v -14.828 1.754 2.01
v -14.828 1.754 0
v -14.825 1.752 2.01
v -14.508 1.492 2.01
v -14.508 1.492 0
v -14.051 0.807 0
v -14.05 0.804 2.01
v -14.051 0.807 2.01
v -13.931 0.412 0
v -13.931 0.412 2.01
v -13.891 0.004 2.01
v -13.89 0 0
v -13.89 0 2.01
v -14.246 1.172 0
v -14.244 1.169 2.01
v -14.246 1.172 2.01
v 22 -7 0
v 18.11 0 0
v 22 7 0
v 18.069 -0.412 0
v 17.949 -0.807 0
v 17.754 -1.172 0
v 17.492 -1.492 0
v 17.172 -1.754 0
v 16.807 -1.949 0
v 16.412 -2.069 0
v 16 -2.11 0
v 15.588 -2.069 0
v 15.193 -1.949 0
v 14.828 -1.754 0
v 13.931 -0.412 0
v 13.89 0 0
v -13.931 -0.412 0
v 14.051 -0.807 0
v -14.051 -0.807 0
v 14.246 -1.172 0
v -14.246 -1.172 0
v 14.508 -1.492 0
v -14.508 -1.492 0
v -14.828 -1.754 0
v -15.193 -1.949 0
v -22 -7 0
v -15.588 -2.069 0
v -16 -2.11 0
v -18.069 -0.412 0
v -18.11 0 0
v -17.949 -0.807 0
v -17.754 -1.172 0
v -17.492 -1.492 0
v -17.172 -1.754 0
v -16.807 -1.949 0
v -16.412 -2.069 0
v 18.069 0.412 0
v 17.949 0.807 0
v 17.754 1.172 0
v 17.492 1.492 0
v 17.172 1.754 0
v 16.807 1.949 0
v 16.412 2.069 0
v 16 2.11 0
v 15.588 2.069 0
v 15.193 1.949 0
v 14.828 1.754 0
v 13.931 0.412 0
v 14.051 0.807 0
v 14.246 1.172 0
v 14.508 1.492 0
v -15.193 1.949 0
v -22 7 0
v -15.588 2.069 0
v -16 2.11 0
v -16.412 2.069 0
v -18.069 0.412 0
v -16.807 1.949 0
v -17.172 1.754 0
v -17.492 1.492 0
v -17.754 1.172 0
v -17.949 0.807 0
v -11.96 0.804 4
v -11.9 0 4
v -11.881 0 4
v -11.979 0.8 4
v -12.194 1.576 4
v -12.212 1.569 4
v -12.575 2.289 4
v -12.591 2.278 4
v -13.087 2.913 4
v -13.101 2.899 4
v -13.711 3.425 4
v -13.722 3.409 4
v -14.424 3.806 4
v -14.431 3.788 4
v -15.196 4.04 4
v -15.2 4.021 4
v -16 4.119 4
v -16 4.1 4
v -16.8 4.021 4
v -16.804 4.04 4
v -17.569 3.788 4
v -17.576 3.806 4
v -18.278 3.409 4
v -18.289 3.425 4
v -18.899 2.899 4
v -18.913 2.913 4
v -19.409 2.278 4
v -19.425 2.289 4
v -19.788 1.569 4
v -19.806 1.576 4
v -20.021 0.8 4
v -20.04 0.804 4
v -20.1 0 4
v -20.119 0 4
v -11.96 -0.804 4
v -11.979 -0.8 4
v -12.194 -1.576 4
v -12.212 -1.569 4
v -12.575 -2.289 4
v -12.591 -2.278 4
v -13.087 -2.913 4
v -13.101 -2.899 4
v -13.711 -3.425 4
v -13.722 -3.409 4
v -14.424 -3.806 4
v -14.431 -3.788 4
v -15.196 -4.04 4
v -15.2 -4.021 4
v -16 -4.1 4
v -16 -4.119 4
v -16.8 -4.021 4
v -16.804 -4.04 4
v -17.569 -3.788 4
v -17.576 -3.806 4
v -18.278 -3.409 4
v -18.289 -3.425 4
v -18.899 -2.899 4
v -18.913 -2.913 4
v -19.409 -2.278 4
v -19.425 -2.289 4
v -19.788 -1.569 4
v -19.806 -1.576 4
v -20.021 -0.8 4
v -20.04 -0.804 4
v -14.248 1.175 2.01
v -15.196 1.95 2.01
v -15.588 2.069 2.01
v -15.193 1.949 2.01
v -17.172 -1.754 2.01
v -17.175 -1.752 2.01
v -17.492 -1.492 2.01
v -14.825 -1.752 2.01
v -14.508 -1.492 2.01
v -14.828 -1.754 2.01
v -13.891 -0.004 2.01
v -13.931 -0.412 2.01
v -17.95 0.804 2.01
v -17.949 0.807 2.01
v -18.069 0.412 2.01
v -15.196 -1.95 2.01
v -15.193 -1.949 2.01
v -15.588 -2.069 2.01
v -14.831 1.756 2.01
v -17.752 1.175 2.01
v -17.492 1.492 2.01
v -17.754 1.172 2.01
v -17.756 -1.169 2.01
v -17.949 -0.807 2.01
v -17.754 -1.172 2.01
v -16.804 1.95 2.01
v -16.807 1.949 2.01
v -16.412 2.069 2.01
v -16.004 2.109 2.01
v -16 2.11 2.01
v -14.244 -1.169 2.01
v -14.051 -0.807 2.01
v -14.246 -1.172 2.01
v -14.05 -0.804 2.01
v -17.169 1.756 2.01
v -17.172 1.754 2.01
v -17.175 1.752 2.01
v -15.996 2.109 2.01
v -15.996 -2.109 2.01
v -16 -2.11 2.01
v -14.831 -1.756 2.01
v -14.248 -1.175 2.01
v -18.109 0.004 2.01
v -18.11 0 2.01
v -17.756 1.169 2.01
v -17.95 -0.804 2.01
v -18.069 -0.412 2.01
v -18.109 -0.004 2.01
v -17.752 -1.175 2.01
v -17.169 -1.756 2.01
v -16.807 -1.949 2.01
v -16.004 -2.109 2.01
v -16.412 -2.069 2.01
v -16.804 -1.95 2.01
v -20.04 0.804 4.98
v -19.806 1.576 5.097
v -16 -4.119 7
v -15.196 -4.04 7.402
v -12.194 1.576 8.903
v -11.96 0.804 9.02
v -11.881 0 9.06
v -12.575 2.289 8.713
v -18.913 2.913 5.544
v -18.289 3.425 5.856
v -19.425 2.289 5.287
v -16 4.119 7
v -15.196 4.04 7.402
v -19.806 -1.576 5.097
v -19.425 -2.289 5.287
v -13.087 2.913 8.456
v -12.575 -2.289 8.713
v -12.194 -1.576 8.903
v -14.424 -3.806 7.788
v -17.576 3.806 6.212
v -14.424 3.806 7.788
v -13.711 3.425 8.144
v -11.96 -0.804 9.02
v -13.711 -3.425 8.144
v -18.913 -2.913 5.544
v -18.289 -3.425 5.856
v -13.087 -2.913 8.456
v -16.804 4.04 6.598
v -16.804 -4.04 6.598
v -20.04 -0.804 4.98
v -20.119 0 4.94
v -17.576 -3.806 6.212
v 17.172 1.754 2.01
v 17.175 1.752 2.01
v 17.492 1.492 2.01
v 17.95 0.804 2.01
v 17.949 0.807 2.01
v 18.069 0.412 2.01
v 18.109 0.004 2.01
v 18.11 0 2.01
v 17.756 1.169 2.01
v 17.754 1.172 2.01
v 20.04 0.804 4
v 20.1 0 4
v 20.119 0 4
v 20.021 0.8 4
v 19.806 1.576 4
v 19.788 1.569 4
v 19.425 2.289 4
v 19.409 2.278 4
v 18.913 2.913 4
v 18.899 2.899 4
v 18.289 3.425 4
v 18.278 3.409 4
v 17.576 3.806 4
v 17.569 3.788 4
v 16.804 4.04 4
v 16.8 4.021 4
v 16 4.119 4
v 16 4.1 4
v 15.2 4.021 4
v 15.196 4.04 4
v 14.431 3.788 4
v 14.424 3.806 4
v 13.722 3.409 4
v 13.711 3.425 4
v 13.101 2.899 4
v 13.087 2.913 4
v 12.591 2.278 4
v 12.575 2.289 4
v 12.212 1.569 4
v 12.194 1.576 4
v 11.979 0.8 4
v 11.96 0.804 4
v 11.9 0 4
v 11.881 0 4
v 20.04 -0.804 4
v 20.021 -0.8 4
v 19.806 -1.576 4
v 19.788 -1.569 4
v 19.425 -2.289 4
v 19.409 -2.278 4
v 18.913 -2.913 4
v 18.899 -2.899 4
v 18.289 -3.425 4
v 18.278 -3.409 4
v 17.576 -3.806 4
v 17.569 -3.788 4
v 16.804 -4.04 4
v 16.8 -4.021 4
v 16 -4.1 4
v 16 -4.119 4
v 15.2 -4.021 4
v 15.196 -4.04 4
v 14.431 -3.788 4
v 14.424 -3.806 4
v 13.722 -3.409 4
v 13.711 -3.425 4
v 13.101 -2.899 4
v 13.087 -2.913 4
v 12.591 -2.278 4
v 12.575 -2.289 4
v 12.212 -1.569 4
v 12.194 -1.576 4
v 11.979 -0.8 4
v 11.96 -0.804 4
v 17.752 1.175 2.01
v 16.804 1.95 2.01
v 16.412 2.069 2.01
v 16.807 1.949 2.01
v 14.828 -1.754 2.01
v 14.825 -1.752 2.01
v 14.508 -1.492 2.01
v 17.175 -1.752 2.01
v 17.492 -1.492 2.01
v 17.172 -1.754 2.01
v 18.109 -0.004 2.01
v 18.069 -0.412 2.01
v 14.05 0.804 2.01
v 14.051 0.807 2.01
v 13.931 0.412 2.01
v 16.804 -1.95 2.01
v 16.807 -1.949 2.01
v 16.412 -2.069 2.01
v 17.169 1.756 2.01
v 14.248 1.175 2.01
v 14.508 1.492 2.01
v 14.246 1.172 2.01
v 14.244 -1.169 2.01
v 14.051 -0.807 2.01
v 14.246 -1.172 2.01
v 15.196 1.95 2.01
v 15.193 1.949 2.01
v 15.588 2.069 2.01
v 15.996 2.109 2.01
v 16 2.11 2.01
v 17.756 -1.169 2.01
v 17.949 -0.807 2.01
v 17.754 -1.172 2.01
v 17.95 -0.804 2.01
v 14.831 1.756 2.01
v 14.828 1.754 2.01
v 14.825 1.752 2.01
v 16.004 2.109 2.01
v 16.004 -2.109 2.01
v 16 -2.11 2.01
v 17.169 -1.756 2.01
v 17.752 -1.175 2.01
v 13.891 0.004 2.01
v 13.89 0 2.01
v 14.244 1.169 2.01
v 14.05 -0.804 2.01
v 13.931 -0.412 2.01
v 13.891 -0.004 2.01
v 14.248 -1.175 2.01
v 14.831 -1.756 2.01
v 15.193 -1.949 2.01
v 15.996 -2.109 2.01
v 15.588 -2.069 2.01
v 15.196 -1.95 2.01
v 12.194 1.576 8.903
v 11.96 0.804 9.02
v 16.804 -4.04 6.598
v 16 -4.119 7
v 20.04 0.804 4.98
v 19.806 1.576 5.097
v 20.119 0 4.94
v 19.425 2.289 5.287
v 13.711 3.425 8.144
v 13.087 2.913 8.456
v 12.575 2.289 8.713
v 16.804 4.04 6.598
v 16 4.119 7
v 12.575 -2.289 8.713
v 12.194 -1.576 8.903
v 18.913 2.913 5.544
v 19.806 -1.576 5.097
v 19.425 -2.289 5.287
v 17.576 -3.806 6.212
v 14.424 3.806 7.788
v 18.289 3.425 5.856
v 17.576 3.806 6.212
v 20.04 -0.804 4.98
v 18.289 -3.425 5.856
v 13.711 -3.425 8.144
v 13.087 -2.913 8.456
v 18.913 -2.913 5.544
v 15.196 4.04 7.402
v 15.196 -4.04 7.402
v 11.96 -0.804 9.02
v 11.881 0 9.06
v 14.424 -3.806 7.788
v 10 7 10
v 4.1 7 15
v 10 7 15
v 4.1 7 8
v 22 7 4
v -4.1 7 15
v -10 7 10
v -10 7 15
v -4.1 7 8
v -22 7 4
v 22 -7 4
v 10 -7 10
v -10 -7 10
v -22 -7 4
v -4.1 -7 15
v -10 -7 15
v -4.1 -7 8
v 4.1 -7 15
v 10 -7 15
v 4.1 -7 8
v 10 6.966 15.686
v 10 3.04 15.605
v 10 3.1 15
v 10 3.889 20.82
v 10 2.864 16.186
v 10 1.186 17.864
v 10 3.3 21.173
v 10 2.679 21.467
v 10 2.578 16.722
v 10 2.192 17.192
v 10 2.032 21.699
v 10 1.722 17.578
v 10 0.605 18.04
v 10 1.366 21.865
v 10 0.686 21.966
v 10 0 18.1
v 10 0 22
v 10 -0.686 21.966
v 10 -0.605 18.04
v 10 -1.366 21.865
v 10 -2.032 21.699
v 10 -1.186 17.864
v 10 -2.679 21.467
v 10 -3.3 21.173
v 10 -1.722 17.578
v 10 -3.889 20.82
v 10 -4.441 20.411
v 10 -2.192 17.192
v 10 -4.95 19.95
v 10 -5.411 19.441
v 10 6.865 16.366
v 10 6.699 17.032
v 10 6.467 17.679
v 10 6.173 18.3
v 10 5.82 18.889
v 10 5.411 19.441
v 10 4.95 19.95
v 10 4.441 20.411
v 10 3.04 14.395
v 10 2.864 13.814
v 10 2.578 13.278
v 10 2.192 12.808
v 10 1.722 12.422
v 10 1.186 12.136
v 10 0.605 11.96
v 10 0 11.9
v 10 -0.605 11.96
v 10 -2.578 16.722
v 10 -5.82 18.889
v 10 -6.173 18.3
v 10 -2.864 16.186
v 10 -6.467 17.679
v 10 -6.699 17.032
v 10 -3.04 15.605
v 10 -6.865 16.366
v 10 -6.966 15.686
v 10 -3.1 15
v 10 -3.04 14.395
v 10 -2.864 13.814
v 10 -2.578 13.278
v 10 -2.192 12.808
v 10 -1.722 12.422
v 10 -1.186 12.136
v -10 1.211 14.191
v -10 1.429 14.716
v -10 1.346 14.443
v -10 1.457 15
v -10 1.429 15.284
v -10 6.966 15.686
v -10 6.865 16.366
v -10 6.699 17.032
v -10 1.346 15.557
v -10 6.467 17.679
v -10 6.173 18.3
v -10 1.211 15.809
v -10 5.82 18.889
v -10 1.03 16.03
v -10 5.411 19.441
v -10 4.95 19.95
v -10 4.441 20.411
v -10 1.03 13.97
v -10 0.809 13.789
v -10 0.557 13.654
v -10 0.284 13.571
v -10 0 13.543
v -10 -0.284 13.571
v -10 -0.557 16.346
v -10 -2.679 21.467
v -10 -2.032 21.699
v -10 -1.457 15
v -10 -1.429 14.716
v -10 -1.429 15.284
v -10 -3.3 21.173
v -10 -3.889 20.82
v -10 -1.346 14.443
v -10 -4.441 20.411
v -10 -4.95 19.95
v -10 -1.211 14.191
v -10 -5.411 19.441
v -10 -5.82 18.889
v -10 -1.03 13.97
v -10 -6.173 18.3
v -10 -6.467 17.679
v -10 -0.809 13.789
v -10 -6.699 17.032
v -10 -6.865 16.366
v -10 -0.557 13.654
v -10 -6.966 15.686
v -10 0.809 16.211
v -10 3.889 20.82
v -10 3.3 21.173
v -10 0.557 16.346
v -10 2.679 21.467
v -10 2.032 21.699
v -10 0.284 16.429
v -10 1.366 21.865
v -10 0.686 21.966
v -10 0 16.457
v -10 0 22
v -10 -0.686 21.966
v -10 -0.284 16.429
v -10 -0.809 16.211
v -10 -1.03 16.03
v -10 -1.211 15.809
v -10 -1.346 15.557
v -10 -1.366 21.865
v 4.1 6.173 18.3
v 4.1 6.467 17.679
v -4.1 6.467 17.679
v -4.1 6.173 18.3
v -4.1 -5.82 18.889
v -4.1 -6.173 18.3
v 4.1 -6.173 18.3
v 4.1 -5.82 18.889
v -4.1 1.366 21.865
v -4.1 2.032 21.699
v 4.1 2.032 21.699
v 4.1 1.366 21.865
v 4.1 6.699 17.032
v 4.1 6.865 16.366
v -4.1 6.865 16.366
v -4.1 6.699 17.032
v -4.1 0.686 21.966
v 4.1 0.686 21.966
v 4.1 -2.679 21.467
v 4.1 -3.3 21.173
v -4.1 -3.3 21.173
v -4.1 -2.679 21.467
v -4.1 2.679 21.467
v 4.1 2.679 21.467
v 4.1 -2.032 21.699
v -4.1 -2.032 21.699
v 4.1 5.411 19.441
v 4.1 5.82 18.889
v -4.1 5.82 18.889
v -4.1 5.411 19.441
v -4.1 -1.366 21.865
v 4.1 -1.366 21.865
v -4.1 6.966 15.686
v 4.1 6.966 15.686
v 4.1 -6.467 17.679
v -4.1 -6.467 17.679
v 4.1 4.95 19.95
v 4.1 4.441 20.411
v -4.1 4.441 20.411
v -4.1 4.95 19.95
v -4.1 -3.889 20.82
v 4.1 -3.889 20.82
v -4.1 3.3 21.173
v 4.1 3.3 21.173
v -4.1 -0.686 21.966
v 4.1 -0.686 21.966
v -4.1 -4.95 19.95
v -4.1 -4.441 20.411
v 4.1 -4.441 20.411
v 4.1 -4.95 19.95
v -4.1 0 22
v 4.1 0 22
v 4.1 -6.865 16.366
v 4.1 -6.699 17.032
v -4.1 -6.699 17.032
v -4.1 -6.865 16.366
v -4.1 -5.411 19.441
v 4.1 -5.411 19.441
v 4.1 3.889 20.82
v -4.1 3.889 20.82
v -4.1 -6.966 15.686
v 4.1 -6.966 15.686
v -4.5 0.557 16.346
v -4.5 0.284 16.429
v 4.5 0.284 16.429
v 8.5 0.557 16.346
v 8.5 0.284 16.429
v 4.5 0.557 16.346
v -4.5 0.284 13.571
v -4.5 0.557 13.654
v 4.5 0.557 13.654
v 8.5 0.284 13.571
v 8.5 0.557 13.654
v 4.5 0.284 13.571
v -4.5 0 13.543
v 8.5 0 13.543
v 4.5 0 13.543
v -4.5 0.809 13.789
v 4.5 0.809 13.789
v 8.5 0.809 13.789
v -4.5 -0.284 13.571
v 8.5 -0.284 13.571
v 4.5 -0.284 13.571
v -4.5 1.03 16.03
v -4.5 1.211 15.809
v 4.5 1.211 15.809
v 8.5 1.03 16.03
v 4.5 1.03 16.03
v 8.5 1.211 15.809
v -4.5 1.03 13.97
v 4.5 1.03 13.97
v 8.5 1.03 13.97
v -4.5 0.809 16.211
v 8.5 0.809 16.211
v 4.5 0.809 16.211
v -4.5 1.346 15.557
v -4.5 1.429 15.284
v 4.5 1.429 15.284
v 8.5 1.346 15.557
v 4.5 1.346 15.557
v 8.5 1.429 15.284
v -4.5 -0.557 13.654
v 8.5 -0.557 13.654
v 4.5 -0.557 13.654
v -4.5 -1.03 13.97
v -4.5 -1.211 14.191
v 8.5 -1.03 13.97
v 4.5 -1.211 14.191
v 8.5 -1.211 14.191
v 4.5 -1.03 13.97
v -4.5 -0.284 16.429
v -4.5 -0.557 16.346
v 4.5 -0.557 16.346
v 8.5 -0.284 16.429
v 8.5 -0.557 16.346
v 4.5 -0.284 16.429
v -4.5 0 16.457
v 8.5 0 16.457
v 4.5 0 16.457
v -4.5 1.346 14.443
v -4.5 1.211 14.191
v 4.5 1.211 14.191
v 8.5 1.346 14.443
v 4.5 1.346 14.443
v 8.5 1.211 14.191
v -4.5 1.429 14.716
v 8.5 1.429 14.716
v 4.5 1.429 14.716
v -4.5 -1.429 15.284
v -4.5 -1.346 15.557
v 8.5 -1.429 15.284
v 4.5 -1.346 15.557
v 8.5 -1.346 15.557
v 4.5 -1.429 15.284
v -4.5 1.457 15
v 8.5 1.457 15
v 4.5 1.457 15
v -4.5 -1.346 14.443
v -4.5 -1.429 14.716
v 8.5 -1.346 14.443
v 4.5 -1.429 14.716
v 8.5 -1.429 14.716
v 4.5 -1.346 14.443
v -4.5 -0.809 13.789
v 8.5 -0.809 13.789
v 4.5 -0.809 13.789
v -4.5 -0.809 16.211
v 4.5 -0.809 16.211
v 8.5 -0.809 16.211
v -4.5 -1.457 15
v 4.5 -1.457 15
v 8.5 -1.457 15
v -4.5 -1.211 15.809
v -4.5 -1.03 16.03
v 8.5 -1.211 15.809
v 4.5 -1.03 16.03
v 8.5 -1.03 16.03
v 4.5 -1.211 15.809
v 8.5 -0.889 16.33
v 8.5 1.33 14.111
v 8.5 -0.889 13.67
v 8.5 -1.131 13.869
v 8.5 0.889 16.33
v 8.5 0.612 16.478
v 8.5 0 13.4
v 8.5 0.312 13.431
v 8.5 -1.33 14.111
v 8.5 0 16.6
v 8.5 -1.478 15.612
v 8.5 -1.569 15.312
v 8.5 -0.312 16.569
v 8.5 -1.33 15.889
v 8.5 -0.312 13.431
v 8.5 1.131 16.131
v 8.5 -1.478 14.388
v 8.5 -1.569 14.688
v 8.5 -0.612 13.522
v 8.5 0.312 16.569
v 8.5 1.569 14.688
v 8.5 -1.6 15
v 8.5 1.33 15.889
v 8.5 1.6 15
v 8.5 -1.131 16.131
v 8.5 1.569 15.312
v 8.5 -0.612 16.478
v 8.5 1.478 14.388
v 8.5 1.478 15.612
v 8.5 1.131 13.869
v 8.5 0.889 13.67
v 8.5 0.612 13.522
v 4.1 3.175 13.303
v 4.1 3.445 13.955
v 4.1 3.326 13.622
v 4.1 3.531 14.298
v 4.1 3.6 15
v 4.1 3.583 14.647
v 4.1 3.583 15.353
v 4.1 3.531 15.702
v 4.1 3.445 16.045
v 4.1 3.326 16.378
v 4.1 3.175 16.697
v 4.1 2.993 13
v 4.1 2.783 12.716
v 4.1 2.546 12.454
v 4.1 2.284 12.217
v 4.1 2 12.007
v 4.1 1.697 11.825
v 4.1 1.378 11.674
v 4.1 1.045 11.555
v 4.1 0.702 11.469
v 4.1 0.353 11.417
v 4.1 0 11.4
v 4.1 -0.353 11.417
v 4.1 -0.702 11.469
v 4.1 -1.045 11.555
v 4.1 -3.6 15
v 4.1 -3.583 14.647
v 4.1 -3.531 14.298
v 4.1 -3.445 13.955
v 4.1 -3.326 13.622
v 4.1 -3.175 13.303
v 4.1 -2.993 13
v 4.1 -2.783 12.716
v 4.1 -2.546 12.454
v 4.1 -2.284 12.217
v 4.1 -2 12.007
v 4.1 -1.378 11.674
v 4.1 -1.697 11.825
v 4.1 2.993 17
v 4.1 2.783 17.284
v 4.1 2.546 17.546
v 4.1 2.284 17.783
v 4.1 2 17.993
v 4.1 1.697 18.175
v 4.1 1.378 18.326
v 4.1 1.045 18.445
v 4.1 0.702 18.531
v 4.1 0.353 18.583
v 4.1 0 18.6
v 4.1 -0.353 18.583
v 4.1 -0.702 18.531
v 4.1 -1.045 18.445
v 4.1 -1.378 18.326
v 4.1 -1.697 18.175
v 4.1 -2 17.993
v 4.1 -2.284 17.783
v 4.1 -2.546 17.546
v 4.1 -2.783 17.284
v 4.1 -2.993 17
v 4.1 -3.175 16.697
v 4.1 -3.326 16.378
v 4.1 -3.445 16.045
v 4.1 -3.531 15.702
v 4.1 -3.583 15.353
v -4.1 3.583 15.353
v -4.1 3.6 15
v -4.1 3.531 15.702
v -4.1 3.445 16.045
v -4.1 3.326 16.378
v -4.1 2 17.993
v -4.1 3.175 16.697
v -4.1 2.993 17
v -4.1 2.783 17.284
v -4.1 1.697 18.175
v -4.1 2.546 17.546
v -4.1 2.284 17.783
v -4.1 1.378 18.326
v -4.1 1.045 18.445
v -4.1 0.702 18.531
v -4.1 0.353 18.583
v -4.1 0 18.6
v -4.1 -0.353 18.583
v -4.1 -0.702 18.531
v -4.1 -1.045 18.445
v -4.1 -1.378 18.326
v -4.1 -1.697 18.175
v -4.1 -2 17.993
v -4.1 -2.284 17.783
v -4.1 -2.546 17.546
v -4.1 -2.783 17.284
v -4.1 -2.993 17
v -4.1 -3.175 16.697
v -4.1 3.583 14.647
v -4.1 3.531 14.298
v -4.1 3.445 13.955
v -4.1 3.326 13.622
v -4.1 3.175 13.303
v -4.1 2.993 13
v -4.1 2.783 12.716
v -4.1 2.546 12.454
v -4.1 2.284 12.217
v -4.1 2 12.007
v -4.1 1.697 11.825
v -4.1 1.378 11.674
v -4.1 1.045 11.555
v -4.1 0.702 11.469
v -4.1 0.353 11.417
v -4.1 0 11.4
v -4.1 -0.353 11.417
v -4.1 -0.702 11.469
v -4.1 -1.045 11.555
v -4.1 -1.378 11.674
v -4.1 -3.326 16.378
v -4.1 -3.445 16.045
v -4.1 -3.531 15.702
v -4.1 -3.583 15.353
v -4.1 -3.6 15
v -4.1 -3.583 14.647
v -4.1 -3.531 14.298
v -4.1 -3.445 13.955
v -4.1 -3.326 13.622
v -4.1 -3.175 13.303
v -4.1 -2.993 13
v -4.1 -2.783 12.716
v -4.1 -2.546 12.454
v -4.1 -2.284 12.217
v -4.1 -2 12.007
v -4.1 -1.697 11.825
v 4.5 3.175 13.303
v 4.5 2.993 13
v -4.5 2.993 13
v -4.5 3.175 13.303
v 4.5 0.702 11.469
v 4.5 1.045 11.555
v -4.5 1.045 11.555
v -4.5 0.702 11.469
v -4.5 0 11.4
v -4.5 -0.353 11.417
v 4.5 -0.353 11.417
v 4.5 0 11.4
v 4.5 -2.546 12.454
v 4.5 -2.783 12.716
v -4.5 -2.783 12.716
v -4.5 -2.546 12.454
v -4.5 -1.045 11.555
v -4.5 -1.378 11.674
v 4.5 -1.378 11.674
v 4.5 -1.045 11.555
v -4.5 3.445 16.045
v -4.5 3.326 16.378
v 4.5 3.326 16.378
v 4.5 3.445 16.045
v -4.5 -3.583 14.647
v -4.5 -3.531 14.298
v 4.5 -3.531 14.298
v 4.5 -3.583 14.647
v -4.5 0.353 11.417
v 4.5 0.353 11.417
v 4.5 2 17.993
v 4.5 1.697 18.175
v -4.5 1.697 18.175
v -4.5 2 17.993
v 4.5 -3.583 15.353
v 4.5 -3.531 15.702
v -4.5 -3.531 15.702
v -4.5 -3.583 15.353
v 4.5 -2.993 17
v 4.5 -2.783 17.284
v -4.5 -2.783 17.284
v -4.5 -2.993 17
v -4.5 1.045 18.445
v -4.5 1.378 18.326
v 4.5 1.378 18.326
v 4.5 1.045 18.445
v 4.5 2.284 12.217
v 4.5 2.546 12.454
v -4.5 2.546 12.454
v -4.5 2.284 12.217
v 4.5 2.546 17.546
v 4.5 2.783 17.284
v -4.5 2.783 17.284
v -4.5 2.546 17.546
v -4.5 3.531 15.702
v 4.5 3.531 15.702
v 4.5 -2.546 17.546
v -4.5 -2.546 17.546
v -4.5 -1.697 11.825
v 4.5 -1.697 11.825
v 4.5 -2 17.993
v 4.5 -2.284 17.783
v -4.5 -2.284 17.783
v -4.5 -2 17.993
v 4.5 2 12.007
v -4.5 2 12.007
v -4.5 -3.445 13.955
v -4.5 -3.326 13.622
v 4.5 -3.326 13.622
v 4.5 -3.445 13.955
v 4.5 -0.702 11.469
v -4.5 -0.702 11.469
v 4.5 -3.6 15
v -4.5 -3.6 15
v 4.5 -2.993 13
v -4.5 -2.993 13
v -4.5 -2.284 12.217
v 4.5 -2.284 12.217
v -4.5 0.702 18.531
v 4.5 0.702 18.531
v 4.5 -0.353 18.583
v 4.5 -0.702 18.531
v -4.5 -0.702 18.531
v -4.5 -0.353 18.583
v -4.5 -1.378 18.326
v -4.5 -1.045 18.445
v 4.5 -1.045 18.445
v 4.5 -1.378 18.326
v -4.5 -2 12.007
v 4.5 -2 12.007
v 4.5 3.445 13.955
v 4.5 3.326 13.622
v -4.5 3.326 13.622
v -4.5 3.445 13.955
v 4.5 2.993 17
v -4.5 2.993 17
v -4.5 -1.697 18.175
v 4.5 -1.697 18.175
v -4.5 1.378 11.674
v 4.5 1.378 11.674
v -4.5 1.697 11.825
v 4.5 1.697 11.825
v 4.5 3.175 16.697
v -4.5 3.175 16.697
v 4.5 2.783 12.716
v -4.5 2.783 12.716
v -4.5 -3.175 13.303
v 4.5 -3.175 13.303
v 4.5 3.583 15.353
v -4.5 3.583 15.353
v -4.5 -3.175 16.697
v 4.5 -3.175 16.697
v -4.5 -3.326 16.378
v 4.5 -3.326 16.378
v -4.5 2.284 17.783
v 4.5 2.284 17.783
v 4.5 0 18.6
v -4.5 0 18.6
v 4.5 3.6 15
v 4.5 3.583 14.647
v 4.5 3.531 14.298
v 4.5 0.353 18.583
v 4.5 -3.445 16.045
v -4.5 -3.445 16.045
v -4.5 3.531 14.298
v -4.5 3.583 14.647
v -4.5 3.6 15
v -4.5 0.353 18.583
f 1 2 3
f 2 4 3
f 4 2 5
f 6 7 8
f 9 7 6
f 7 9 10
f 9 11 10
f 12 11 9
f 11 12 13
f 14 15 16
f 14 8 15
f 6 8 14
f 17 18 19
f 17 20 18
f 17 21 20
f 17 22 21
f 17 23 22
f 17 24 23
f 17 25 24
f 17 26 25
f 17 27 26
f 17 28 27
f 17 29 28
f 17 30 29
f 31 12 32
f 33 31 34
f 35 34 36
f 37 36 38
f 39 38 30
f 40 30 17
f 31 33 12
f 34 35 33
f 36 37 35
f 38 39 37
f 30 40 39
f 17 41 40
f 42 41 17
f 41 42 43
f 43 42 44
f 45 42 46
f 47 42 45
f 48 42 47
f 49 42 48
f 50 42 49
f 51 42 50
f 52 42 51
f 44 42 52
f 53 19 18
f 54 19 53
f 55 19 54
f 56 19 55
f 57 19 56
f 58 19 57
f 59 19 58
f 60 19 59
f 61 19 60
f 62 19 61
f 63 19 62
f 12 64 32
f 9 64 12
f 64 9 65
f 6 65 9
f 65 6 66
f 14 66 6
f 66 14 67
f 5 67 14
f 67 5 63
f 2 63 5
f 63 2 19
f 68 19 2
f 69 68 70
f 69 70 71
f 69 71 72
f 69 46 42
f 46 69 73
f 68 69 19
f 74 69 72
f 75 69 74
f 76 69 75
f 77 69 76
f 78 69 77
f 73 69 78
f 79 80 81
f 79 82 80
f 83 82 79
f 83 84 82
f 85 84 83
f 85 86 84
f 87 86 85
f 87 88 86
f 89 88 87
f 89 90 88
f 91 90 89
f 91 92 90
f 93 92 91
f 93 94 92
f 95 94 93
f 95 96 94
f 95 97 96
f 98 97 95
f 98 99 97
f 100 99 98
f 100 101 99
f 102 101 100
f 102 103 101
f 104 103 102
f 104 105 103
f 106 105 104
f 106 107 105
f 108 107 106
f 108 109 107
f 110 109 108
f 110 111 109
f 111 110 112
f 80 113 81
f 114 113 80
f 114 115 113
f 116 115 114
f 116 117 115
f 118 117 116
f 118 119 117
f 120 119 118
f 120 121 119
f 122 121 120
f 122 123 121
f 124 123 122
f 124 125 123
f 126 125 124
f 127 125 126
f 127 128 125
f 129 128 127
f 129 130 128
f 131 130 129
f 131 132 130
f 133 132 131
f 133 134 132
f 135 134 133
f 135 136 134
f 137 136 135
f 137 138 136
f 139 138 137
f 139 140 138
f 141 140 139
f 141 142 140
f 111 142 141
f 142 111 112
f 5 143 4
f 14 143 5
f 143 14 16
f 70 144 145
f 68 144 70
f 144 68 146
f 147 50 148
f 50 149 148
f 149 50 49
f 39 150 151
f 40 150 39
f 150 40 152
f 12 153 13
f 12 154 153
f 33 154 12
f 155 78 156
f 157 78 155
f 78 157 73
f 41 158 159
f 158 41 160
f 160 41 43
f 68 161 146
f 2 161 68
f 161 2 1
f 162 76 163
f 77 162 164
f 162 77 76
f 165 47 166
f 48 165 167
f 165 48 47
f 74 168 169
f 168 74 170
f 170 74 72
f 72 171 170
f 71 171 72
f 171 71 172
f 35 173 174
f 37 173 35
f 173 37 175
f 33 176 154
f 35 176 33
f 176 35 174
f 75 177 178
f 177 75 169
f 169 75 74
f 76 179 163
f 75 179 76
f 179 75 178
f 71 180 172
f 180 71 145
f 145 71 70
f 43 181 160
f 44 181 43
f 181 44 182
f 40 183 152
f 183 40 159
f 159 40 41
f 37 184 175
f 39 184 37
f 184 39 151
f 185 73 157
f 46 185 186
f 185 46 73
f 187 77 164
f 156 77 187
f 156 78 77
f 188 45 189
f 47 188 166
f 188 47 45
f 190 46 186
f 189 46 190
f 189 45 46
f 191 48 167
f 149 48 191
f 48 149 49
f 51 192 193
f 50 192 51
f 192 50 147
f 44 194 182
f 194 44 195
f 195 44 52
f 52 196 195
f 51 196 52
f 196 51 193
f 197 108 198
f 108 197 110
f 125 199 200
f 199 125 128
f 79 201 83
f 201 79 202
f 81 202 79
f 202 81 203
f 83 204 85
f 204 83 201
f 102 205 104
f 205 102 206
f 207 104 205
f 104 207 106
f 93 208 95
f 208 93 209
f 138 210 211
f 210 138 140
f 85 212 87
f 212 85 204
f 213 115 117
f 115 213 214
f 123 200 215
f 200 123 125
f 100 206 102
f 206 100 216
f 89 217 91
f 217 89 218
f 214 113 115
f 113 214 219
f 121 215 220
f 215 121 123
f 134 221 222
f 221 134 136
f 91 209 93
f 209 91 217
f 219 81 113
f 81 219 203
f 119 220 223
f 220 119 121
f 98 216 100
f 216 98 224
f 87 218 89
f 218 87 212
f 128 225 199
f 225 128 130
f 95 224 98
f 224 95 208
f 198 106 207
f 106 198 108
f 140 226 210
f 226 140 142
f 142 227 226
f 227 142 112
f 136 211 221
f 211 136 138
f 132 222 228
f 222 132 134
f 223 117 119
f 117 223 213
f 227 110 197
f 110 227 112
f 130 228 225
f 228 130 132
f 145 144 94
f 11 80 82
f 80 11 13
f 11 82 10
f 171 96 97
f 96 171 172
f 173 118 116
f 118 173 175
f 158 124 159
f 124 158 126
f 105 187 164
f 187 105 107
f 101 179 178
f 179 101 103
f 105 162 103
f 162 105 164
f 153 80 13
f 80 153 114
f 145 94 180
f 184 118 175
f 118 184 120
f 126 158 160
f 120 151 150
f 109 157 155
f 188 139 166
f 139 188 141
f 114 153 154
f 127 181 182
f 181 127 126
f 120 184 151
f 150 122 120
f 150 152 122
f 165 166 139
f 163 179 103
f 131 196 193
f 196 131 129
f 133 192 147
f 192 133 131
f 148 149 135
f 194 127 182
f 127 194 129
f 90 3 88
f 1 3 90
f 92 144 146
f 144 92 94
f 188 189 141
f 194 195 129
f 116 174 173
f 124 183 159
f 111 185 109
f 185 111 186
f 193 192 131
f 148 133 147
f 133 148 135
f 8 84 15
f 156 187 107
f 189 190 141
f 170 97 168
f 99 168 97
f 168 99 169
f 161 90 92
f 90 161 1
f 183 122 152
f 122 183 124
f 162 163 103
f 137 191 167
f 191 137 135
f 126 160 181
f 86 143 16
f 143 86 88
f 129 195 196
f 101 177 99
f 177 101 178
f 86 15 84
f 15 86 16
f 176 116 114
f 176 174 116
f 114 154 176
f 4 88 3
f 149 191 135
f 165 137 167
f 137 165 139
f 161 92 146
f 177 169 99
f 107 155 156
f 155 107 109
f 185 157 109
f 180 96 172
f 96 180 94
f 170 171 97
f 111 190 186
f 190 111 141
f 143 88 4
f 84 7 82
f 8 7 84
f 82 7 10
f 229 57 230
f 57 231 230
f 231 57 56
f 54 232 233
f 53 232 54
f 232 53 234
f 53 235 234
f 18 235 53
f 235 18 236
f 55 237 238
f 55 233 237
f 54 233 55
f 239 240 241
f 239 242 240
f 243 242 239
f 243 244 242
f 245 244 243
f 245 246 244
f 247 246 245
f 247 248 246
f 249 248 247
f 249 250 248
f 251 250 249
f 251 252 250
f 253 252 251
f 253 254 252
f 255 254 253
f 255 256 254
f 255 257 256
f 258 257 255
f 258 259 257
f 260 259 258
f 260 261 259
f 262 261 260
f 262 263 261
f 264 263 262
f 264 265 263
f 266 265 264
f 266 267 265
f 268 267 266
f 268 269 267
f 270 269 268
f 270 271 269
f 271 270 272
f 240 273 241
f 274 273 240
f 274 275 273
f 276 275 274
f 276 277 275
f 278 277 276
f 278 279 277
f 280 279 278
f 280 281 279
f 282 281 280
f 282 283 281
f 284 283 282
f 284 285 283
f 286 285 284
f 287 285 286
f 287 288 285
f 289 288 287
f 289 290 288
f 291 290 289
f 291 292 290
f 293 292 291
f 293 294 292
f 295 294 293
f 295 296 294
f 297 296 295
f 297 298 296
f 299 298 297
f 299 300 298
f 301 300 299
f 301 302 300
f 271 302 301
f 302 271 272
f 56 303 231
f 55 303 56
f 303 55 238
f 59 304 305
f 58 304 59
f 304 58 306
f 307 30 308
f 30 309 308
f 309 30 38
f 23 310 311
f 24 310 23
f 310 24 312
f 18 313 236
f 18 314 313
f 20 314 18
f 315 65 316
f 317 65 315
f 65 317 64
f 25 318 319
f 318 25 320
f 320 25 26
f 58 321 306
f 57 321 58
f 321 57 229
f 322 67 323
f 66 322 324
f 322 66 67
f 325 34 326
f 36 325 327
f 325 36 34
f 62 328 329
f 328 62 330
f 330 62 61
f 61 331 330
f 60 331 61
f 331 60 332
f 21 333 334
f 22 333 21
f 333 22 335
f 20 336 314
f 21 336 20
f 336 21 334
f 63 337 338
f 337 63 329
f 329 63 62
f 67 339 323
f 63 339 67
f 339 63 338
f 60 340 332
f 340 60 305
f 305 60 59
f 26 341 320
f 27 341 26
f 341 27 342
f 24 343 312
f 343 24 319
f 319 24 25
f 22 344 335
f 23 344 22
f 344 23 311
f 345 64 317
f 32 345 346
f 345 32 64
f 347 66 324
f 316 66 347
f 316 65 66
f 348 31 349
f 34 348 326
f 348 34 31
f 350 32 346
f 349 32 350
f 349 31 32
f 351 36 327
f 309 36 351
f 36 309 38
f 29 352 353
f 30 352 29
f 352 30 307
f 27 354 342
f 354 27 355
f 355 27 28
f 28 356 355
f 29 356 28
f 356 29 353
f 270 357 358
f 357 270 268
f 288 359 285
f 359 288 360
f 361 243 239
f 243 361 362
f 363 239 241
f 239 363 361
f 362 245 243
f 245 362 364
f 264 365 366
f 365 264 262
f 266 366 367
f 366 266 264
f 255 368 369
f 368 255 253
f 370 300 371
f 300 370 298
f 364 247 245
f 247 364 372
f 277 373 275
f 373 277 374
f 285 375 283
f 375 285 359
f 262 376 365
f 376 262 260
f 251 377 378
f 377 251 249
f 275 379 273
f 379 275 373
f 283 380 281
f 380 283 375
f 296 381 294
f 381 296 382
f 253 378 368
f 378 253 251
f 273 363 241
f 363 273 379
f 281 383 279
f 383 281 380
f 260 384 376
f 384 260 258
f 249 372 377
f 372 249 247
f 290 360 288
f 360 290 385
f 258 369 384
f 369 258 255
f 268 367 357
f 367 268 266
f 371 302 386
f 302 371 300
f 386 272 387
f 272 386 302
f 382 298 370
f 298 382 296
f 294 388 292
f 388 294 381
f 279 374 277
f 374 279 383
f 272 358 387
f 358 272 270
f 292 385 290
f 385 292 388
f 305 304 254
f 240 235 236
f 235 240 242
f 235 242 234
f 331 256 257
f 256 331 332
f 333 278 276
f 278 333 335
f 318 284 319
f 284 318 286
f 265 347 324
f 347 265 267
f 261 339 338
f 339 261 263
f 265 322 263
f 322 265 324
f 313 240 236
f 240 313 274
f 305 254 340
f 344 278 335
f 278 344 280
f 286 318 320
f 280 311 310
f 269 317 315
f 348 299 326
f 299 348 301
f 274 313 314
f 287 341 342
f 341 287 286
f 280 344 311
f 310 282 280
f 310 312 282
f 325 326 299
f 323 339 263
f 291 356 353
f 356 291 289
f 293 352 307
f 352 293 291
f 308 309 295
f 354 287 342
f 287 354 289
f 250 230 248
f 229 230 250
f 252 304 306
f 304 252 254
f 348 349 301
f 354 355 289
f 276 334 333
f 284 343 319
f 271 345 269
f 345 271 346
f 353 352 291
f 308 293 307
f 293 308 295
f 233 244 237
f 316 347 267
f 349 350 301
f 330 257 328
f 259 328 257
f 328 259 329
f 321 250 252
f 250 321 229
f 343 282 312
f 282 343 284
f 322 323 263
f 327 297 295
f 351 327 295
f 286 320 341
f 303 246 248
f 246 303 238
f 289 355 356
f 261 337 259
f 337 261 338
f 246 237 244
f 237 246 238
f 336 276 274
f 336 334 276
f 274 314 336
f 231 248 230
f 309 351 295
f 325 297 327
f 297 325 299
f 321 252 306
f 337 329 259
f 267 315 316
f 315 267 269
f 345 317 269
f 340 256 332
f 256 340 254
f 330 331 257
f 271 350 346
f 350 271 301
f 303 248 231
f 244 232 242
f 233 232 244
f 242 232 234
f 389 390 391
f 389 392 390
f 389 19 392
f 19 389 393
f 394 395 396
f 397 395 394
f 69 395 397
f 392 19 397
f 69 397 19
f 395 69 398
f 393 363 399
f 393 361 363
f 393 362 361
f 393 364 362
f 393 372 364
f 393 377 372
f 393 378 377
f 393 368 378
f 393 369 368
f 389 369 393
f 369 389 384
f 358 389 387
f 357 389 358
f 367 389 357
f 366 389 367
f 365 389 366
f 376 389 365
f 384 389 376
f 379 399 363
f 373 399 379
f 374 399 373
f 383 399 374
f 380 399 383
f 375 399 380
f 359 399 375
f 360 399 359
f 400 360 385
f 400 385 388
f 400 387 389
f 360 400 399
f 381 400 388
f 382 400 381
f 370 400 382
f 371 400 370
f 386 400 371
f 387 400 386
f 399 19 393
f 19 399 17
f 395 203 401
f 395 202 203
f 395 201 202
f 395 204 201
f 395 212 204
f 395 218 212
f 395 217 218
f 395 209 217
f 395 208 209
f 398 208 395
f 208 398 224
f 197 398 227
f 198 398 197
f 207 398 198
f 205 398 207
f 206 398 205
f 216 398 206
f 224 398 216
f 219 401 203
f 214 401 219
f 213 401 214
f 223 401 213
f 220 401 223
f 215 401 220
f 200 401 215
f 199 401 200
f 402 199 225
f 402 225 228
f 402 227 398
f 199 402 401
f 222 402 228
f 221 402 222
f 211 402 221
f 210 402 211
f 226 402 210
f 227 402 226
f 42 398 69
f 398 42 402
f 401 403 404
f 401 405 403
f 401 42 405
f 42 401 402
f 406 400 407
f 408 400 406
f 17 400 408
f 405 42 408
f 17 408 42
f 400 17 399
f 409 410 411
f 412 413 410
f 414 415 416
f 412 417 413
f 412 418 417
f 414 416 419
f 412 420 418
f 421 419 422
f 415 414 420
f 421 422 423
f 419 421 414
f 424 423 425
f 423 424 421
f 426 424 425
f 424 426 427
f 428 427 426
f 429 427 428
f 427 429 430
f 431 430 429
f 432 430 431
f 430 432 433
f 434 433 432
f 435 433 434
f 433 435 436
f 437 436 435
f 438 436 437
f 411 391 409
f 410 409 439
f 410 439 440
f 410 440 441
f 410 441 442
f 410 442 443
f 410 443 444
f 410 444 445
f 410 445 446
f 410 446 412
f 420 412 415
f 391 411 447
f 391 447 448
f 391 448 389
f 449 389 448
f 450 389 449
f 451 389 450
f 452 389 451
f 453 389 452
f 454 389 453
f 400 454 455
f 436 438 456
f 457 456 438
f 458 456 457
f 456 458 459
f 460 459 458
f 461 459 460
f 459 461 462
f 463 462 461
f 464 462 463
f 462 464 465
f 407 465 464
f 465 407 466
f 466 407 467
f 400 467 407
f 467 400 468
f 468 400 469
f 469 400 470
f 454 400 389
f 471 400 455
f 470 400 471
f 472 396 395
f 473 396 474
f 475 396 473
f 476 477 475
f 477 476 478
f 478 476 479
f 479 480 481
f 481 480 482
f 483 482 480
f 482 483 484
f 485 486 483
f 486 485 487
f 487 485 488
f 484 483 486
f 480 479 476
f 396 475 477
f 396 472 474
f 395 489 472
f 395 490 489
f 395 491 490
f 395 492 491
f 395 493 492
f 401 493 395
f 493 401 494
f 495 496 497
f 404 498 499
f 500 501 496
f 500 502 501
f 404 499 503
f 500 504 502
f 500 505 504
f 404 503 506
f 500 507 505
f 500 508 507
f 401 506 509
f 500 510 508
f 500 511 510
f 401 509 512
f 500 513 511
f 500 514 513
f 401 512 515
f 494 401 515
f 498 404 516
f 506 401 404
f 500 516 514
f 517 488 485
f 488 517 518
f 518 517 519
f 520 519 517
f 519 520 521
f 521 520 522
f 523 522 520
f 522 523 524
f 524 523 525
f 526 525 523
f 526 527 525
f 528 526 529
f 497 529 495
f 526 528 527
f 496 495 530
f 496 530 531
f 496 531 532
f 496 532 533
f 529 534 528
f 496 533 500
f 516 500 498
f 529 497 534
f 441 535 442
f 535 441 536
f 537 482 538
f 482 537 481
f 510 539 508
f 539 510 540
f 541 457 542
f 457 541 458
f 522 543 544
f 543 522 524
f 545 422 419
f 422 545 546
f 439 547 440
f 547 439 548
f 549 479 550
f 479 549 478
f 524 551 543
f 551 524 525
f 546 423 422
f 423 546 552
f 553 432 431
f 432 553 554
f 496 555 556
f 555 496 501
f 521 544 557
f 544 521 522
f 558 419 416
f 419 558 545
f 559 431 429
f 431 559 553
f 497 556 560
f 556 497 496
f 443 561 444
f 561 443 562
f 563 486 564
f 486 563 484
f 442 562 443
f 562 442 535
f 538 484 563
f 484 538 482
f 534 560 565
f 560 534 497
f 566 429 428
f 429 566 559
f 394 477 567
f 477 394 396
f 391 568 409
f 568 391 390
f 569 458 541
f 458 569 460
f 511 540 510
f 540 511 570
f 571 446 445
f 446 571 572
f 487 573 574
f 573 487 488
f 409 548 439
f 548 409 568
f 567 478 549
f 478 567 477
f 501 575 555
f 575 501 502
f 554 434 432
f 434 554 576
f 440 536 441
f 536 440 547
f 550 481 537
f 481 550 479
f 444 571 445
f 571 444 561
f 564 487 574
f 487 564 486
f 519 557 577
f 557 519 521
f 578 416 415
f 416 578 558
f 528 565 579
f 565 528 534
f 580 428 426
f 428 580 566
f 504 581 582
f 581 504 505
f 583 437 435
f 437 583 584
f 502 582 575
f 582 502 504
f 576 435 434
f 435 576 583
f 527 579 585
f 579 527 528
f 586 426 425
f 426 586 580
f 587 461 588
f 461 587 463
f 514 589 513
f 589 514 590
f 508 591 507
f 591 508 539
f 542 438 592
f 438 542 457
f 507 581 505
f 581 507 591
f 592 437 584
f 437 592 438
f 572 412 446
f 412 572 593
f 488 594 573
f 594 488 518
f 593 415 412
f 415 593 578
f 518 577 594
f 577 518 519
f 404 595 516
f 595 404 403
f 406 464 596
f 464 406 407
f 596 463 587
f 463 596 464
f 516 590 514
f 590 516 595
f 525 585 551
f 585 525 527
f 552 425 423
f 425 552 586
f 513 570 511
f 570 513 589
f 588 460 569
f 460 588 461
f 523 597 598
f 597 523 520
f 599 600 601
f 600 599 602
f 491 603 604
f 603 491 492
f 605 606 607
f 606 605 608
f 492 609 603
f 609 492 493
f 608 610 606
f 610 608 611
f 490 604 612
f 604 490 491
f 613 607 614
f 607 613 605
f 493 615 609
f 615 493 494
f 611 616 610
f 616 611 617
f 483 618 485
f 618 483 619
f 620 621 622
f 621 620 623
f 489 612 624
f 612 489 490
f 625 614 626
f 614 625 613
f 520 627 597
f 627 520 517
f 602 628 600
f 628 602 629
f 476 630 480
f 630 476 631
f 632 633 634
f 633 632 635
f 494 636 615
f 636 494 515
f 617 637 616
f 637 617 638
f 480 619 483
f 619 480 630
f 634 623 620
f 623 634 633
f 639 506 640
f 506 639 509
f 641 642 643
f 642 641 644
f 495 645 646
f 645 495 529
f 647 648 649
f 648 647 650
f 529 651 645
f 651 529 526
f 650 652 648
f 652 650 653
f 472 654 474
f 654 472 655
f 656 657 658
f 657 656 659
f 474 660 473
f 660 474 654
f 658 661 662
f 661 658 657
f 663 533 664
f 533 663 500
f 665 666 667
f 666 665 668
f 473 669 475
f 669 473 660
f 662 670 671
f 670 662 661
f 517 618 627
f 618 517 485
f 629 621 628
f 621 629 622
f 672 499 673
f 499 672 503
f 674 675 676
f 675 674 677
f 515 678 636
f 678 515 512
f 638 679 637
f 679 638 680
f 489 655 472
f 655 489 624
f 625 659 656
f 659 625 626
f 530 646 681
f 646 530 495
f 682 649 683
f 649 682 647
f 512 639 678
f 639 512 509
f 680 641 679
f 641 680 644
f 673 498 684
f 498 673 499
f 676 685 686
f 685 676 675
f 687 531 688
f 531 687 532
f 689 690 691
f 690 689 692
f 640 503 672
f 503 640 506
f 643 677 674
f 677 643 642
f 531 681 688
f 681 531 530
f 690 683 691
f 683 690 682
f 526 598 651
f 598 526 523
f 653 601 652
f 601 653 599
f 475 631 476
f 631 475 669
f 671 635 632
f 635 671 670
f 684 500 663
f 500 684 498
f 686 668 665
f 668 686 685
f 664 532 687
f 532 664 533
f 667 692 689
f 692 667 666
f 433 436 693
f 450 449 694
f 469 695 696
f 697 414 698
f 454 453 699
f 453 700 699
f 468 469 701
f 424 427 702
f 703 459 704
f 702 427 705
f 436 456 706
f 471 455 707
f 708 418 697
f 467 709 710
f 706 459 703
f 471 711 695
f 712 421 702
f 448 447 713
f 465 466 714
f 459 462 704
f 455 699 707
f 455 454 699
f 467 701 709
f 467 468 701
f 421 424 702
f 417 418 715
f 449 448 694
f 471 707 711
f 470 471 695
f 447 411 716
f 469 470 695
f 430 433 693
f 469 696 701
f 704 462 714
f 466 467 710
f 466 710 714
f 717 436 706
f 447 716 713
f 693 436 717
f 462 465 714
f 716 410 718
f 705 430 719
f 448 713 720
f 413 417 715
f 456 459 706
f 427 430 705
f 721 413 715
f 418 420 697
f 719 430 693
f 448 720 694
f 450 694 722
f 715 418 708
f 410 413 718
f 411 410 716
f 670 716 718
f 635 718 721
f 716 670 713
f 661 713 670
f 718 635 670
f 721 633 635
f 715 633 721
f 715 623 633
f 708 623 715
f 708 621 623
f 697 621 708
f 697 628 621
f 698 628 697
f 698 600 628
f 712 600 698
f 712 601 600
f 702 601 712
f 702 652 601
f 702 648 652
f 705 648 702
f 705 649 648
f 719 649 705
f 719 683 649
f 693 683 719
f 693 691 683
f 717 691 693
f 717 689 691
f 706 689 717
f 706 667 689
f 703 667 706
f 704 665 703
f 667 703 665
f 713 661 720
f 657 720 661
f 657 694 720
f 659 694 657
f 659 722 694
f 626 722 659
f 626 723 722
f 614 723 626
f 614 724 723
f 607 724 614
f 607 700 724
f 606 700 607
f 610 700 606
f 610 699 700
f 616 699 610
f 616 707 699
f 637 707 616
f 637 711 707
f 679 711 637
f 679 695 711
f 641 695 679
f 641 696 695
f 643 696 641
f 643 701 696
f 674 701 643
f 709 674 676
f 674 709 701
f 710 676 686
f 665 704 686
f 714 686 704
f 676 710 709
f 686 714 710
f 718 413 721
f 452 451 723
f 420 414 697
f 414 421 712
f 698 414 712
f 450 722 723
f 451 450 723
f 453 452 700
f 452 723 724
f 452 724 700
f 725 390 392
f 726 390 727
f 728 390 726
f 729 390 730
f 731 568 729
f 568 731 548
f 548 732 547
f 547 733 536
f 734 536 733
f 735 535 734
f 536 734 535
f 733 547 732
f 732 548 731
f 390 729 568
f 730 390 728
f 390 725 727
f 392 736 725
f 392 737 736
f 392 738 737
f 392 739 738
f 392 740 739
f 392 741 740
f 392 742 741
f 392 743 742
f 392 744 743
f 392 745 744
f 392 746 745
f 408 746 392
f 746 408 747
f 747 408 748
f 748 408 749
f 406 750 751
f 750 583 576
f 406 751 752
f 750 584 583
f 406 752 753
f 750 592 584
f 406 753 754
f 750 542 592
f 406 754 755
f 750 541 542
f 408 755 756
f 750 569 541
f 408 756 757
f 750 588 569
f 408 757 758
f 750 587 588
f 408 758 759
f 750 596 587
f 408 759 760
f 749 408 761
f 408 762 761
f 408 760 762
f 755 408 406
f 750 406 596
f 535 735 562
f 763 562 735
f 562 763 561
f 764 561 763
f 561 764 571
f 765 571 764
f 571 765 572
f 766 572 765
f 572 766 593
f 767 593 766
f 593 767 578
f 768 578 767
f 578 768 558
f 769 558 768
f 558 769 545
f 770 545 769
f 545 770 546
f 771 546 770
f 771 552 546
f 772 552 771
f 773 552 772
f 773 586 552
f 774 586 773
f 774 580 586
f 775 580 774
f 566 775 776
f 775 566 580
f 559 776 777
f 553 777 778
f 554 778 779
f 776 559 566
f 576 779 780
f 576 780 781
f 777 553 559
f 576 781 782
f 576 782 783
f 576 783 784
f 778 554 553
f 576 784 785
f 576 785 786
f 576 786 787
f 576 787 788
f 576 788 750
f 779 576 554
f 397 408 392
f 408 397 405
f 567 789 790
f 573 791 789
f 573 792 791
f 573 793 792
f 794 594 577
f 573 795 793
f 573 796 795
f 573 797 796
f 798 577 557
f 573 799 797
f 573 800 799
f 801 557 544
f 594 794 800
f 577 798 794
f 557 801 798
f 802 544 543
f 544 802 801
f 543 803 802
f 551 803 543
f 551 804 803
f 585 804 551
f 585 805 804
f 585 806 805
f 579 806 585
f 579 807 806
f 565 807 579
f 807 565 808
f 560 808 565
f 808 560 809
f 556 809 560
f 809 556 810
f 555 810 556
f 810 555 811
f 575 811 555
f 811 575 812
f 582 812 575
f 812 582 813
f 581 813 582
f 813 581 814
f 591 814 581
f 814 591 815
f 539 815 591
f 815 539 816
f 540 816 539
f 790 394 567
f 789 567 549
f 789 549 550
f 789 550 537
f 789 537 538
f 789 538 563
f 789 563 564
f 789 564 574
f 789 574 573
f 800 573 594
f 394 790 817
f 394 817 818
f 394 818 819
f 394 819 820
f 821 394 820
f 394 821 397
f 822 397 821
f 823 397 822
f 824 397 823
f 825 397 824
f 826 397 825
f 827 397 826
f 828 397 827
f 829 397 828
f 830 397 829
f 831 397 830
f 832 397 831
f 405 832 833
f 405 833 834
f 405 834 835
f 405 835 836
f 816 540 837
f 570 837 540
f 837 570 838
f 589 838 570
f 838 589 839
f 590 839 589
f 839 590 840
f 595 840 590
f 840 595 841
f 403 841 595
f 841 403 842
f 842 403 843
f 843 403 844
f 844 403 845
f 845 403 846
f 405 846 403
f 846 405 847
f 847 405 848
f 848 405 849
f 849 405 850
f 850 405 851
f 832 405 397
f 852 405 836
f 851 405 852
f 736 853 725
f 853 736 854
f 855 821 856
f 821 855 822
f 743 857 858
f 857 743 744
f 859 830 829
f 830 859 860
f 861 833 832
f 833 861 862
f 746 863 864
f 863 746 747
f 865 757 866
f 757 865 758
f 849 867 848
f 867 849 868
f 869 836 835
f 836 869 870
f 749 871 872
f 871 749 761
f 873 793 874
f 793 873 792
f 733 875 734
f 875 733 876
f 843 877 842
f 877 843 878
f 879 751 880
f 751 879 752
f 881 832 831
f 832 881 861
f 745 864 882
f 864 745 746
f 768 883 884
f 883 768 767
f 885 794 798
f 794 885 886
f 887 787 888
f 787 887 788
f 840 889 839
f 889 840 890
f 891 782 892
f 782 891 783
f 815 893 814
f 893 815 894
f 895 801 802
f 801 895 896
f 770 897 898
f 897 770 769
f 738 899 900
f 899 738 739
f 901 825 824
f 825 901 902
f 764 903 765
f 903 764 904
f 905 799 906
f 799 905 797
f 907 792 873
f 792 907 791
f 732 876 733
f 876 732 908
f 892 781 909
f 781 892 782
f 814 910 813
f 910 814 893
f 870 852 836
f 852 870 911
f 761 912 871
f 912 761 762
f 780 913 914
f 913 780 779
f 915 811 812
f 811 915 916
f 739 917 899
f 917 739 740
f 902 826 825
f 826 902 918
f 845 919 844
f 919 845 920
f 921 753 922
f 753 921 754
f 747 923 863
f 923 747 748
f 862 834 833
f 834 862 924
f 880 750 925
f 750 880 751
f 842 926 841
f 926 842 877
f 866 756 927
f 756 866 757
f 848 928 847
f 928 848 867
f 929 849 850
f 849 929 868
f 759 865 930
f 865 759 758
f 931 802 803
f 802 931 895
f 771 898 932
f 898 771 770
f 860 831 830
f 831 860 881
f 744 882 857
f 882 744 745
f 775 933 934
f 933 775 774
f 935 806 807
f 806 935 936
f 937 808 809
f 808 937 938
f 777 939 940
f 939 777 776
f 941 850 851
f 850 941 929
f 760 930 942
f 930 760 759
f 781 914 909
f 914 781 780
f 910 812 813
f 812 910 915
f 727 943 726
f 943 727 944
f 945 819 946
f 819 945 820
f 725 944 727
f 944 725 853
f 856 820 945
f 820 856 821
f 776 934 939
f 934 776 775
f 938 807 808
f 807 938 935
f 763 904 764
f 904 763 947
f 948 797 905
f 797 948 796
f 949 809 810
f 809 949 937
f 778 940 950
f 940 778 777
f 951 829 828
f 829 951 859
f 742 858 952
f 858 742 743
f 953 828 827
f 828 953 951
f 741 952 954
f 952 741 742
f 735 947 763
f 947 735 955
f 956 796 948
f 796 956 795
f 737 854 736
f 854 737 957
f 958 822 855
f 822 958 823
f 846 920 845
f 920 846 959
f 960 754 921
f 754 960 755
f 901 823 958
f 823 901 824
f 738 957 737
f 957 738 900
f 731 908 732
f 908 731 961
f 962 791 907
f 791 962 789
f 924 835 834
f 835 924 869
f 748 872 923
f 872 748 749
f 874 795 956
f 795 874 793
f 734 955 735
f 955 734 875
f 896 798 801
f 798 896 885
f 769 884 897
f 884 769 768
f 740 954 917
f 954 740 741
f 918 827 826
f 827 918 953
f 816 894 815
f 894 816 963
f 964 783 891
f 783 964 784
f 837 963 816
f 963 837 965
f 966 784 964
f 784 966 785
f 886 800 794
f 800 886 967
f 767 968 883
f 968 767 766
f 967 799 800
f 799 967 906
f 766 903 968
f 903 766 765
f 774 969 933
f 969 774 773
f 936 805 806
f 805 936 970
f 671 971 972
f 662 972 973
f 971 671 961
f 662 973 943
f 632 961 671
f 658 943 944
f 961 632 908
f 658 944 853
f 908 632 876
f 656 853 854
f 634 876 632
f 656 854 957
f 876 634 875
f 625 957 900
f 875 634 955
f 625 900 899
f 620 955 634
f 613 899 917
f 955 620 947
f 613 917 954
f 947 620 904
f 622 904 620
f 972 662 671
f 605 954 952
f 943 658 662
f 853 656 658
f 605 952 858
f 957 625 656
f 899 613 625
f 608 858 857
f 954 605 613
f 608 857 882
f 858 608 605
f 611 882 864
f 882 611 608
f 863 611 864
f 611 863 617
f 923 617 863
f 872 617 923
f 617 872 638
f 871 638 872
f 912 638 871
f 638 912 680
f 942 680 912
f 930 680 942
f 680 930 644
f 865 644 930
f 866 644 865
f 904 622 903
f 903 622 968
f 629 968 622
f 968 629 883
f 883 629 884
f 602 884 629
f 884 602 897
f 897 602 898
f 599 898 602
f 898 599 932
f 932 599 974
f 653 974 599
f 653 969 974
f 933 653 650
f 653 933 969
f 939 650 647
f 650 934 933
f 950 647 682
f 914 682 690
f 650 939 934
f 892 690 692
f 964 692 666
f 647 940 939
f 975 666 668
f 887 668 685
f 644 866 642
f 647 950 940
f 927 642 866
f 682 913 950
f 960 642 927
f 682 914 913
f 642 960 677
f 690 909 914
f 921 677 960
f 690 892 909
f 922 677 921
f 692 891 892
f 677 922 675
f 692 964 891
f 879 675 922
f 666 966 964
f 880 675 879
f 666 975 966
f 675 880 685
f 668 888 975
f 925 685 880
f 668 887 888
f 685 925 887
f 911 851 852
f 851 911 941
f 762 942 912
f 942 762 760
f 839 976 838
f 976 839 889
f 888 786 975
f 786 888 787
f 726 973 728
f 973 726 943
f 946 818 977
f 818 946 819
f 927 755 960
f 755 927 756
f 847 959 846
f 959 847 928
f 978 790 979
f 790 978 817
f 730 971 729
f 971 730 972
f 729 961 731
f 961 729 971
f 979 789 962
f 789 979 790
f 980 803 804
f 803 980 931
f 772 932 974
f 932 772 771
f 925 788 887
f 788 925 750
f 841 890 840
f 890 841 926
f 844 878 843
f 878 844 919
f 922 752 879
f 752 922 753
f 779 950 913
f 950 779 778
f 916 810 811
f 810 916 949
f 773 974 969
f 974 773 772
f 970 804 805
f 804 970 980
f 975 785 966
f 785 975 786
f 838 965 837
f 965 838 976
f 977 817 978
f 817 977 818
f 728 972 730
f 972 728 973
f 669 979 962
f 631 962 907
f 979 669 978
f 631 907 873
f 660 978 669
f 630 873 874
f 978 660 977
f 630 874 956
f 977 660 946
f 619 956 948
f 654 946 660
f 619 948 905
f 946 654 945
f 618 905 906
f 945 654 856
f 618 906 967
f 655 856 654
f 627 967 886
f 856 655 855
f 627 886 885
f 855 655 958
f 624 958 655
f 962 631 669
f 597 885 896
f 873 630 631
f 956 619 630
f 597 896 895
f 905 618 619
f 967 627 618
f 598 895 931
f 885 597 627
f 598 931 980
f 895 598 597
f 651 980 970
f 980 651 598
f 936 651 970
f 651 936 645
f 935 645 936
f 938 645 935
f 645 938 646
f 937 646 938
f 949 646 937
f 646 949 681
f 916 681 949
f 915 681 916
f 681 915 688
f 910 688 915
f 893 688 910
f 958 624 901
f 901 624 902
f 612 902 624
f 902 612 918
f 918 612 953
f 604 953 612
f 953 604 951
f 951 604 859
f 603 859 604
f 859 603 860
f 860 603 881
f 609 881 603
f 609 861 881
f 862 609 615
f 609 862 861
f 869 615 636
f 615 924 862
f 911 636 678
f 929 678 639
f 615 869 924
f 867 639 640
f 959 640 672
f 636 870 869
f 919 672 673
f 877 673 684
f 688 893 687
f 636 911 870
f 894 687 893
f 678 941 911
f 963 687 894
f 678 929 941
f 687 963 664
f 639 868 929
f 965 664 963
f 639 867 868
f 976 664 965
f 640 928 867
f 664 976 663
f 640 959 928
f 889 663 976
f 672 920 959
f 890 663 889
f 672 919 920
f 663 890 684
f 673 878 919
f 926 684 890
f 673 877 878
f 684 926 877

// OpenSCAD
// file: bolts.scad
$radial_error = 0.1;
$fn = 32;

module cylinder_outer(height, radius, fn=$fn) {
	fudge = 1/cos(180/fn);
	cylinder(h=height,r=radius*fudge+$radial_error, $fn=fn);
}

module cylinder_inner(height, radius, fn=$fn) {
	cylinder(h=height,r=radius-$radial_error,$fn=fn);
}

// Make a hole for a bolt/screw combination.
module bolt(diameter=3, depth=8, nut_offset=2, shaft_length=10, inset=10) {
	hole(diameter, depth, inset);
	hull() {
		shaft_width = diameter;
		translate([0, 0, nut_offset]) rotate(360/12, [0, 0, 1]) cylinder_outer(diameter, shaft_width, 6);
		translate([0, shaft_length, nut_offset]) rotate(360/12, [0, 0, 1]) cylinder_outer(diameter, shaft_width, 6);
	}
}

// Make a hole. The diameter is the size of the screw (e.g. 3 for M3). Depth is how far the hole should go for the thread, and inset is how far out there should be a hole for the head to go.
module hole(diameter=3, depth=6, inset=10) {
	cylinder_outer(depth, diameter/2);
	translate([0, 0, depth]) cylinder_outer(inset, diameter, 32);
}

module countersunk_hole(diameter=3, depth=6, inset=10) {
	hole(diameter, depth, inset);
	translate([0, 0, depth-diameter/2]) cylinder(r1=diameter/2+$radial_error, r2=diameter+$radial_error, h=diameter/2);
}

module threaded_countersunk_hole(diameter=3, depth=6, inset=10) {
	hole(diameter*0.9, depth, inset);
	translate([0, 0, depth-diameter/2]) cylinder(r1=diameter/2+$radial_error, r2=diameter+$radial_error, h=diameter/2);
}

module countersunk_bolt(diameter=3, depth=8, nut_offset=2, shaft_length=10, inset=10) {
	countersunk_hole(diameter, depth, inset);
	hull() {
		shaft_width = diameter;
		translate([0, 0, nut_offset]) rotate(360/12, [0, 0, 1]) cylinder_outer(diameter, shaft_width, 6);
		translate([0, shaft_length, nut_offset]) rotate(360/12, [0, 0, 1]) cylinder_outer(diameter, shaft_width, 6);
	}
}

module mounting_hole(diameter=3, depth=6, inset=10, outset=3) {
	difference() {
		cylinder_outer(depth, diameter/2+outset);
		hole(diameter=diameter, depth=depth, inset=inset);
	}
}

rotate(90, [1, 0, 0]) difference() {
	cube([30, 10, 10]);
	translate([5, 5, 0]) bolt(diameter=3, depth=8);
	translate([15, 5, 0]) bolt(diameter=4, depth=8);
	translate([25, 5, 0]) countersunk_hole(diameter=4, depth=8);
}
// file: zcube.scad
// This function creates a cube with a given x/y either above (f=1) or below (f=-1) the z axis.
module zcube(dimensions, z=0, f=1) {
	translate([0, 0, dimensions[2]/2 * f + z]) cube(dimensions, true);
}
// main file
use <zcube.scad>;
use <bolts.scad>;

$fn = 64;

width = 44;

height = 14;
thickness = 4;

diameter = 4;

module bracket(spacing=32) {
	difference() {
		hull() {
			zcube([width, height, 4]);
			zcube([20, height, 10]);
		}
		translate([-spacing/2, 0, 0]) countersunk_hole(4, depth=thickness);
		translate([spacing/2, 0, 0]) countersunk_hole(4, depth=thickness);
	}
}

module top(latch_width=20, gap=8.2, outset=22) {
	difference() {
		union() {
			bracket();
			
			//translate([0, -height/2, diameter]) rotate(90, [-1, 0, 0]) cylinder_outer(height, diameter, 32);
			zcube([latch_width, height, outset/2+thickness]);
			translate([-latch_width/2, 0, outset/2+thickness]) rotate(90, [0, 1, 0]) cylinder(d=height, h=latch_width);
		}
		
		translate([0, 0, thickness+4]) zcube([gap, height, latch_width]);
		translate([-latch_width/2, 0, outset/2+thickness]) rotate(90, [0, 1, 0]) threaded_countersunk_hole(3, depth=latch_width, nut_offset=0, shaft_length=0);
		
		translate([0, 0, outset/2+thickness]) rotate(90, [0, 1, 0]) {
			cylinder(d=7.2,h=gap+0.4*2, center=true);
		}
	}
}

render() top();
